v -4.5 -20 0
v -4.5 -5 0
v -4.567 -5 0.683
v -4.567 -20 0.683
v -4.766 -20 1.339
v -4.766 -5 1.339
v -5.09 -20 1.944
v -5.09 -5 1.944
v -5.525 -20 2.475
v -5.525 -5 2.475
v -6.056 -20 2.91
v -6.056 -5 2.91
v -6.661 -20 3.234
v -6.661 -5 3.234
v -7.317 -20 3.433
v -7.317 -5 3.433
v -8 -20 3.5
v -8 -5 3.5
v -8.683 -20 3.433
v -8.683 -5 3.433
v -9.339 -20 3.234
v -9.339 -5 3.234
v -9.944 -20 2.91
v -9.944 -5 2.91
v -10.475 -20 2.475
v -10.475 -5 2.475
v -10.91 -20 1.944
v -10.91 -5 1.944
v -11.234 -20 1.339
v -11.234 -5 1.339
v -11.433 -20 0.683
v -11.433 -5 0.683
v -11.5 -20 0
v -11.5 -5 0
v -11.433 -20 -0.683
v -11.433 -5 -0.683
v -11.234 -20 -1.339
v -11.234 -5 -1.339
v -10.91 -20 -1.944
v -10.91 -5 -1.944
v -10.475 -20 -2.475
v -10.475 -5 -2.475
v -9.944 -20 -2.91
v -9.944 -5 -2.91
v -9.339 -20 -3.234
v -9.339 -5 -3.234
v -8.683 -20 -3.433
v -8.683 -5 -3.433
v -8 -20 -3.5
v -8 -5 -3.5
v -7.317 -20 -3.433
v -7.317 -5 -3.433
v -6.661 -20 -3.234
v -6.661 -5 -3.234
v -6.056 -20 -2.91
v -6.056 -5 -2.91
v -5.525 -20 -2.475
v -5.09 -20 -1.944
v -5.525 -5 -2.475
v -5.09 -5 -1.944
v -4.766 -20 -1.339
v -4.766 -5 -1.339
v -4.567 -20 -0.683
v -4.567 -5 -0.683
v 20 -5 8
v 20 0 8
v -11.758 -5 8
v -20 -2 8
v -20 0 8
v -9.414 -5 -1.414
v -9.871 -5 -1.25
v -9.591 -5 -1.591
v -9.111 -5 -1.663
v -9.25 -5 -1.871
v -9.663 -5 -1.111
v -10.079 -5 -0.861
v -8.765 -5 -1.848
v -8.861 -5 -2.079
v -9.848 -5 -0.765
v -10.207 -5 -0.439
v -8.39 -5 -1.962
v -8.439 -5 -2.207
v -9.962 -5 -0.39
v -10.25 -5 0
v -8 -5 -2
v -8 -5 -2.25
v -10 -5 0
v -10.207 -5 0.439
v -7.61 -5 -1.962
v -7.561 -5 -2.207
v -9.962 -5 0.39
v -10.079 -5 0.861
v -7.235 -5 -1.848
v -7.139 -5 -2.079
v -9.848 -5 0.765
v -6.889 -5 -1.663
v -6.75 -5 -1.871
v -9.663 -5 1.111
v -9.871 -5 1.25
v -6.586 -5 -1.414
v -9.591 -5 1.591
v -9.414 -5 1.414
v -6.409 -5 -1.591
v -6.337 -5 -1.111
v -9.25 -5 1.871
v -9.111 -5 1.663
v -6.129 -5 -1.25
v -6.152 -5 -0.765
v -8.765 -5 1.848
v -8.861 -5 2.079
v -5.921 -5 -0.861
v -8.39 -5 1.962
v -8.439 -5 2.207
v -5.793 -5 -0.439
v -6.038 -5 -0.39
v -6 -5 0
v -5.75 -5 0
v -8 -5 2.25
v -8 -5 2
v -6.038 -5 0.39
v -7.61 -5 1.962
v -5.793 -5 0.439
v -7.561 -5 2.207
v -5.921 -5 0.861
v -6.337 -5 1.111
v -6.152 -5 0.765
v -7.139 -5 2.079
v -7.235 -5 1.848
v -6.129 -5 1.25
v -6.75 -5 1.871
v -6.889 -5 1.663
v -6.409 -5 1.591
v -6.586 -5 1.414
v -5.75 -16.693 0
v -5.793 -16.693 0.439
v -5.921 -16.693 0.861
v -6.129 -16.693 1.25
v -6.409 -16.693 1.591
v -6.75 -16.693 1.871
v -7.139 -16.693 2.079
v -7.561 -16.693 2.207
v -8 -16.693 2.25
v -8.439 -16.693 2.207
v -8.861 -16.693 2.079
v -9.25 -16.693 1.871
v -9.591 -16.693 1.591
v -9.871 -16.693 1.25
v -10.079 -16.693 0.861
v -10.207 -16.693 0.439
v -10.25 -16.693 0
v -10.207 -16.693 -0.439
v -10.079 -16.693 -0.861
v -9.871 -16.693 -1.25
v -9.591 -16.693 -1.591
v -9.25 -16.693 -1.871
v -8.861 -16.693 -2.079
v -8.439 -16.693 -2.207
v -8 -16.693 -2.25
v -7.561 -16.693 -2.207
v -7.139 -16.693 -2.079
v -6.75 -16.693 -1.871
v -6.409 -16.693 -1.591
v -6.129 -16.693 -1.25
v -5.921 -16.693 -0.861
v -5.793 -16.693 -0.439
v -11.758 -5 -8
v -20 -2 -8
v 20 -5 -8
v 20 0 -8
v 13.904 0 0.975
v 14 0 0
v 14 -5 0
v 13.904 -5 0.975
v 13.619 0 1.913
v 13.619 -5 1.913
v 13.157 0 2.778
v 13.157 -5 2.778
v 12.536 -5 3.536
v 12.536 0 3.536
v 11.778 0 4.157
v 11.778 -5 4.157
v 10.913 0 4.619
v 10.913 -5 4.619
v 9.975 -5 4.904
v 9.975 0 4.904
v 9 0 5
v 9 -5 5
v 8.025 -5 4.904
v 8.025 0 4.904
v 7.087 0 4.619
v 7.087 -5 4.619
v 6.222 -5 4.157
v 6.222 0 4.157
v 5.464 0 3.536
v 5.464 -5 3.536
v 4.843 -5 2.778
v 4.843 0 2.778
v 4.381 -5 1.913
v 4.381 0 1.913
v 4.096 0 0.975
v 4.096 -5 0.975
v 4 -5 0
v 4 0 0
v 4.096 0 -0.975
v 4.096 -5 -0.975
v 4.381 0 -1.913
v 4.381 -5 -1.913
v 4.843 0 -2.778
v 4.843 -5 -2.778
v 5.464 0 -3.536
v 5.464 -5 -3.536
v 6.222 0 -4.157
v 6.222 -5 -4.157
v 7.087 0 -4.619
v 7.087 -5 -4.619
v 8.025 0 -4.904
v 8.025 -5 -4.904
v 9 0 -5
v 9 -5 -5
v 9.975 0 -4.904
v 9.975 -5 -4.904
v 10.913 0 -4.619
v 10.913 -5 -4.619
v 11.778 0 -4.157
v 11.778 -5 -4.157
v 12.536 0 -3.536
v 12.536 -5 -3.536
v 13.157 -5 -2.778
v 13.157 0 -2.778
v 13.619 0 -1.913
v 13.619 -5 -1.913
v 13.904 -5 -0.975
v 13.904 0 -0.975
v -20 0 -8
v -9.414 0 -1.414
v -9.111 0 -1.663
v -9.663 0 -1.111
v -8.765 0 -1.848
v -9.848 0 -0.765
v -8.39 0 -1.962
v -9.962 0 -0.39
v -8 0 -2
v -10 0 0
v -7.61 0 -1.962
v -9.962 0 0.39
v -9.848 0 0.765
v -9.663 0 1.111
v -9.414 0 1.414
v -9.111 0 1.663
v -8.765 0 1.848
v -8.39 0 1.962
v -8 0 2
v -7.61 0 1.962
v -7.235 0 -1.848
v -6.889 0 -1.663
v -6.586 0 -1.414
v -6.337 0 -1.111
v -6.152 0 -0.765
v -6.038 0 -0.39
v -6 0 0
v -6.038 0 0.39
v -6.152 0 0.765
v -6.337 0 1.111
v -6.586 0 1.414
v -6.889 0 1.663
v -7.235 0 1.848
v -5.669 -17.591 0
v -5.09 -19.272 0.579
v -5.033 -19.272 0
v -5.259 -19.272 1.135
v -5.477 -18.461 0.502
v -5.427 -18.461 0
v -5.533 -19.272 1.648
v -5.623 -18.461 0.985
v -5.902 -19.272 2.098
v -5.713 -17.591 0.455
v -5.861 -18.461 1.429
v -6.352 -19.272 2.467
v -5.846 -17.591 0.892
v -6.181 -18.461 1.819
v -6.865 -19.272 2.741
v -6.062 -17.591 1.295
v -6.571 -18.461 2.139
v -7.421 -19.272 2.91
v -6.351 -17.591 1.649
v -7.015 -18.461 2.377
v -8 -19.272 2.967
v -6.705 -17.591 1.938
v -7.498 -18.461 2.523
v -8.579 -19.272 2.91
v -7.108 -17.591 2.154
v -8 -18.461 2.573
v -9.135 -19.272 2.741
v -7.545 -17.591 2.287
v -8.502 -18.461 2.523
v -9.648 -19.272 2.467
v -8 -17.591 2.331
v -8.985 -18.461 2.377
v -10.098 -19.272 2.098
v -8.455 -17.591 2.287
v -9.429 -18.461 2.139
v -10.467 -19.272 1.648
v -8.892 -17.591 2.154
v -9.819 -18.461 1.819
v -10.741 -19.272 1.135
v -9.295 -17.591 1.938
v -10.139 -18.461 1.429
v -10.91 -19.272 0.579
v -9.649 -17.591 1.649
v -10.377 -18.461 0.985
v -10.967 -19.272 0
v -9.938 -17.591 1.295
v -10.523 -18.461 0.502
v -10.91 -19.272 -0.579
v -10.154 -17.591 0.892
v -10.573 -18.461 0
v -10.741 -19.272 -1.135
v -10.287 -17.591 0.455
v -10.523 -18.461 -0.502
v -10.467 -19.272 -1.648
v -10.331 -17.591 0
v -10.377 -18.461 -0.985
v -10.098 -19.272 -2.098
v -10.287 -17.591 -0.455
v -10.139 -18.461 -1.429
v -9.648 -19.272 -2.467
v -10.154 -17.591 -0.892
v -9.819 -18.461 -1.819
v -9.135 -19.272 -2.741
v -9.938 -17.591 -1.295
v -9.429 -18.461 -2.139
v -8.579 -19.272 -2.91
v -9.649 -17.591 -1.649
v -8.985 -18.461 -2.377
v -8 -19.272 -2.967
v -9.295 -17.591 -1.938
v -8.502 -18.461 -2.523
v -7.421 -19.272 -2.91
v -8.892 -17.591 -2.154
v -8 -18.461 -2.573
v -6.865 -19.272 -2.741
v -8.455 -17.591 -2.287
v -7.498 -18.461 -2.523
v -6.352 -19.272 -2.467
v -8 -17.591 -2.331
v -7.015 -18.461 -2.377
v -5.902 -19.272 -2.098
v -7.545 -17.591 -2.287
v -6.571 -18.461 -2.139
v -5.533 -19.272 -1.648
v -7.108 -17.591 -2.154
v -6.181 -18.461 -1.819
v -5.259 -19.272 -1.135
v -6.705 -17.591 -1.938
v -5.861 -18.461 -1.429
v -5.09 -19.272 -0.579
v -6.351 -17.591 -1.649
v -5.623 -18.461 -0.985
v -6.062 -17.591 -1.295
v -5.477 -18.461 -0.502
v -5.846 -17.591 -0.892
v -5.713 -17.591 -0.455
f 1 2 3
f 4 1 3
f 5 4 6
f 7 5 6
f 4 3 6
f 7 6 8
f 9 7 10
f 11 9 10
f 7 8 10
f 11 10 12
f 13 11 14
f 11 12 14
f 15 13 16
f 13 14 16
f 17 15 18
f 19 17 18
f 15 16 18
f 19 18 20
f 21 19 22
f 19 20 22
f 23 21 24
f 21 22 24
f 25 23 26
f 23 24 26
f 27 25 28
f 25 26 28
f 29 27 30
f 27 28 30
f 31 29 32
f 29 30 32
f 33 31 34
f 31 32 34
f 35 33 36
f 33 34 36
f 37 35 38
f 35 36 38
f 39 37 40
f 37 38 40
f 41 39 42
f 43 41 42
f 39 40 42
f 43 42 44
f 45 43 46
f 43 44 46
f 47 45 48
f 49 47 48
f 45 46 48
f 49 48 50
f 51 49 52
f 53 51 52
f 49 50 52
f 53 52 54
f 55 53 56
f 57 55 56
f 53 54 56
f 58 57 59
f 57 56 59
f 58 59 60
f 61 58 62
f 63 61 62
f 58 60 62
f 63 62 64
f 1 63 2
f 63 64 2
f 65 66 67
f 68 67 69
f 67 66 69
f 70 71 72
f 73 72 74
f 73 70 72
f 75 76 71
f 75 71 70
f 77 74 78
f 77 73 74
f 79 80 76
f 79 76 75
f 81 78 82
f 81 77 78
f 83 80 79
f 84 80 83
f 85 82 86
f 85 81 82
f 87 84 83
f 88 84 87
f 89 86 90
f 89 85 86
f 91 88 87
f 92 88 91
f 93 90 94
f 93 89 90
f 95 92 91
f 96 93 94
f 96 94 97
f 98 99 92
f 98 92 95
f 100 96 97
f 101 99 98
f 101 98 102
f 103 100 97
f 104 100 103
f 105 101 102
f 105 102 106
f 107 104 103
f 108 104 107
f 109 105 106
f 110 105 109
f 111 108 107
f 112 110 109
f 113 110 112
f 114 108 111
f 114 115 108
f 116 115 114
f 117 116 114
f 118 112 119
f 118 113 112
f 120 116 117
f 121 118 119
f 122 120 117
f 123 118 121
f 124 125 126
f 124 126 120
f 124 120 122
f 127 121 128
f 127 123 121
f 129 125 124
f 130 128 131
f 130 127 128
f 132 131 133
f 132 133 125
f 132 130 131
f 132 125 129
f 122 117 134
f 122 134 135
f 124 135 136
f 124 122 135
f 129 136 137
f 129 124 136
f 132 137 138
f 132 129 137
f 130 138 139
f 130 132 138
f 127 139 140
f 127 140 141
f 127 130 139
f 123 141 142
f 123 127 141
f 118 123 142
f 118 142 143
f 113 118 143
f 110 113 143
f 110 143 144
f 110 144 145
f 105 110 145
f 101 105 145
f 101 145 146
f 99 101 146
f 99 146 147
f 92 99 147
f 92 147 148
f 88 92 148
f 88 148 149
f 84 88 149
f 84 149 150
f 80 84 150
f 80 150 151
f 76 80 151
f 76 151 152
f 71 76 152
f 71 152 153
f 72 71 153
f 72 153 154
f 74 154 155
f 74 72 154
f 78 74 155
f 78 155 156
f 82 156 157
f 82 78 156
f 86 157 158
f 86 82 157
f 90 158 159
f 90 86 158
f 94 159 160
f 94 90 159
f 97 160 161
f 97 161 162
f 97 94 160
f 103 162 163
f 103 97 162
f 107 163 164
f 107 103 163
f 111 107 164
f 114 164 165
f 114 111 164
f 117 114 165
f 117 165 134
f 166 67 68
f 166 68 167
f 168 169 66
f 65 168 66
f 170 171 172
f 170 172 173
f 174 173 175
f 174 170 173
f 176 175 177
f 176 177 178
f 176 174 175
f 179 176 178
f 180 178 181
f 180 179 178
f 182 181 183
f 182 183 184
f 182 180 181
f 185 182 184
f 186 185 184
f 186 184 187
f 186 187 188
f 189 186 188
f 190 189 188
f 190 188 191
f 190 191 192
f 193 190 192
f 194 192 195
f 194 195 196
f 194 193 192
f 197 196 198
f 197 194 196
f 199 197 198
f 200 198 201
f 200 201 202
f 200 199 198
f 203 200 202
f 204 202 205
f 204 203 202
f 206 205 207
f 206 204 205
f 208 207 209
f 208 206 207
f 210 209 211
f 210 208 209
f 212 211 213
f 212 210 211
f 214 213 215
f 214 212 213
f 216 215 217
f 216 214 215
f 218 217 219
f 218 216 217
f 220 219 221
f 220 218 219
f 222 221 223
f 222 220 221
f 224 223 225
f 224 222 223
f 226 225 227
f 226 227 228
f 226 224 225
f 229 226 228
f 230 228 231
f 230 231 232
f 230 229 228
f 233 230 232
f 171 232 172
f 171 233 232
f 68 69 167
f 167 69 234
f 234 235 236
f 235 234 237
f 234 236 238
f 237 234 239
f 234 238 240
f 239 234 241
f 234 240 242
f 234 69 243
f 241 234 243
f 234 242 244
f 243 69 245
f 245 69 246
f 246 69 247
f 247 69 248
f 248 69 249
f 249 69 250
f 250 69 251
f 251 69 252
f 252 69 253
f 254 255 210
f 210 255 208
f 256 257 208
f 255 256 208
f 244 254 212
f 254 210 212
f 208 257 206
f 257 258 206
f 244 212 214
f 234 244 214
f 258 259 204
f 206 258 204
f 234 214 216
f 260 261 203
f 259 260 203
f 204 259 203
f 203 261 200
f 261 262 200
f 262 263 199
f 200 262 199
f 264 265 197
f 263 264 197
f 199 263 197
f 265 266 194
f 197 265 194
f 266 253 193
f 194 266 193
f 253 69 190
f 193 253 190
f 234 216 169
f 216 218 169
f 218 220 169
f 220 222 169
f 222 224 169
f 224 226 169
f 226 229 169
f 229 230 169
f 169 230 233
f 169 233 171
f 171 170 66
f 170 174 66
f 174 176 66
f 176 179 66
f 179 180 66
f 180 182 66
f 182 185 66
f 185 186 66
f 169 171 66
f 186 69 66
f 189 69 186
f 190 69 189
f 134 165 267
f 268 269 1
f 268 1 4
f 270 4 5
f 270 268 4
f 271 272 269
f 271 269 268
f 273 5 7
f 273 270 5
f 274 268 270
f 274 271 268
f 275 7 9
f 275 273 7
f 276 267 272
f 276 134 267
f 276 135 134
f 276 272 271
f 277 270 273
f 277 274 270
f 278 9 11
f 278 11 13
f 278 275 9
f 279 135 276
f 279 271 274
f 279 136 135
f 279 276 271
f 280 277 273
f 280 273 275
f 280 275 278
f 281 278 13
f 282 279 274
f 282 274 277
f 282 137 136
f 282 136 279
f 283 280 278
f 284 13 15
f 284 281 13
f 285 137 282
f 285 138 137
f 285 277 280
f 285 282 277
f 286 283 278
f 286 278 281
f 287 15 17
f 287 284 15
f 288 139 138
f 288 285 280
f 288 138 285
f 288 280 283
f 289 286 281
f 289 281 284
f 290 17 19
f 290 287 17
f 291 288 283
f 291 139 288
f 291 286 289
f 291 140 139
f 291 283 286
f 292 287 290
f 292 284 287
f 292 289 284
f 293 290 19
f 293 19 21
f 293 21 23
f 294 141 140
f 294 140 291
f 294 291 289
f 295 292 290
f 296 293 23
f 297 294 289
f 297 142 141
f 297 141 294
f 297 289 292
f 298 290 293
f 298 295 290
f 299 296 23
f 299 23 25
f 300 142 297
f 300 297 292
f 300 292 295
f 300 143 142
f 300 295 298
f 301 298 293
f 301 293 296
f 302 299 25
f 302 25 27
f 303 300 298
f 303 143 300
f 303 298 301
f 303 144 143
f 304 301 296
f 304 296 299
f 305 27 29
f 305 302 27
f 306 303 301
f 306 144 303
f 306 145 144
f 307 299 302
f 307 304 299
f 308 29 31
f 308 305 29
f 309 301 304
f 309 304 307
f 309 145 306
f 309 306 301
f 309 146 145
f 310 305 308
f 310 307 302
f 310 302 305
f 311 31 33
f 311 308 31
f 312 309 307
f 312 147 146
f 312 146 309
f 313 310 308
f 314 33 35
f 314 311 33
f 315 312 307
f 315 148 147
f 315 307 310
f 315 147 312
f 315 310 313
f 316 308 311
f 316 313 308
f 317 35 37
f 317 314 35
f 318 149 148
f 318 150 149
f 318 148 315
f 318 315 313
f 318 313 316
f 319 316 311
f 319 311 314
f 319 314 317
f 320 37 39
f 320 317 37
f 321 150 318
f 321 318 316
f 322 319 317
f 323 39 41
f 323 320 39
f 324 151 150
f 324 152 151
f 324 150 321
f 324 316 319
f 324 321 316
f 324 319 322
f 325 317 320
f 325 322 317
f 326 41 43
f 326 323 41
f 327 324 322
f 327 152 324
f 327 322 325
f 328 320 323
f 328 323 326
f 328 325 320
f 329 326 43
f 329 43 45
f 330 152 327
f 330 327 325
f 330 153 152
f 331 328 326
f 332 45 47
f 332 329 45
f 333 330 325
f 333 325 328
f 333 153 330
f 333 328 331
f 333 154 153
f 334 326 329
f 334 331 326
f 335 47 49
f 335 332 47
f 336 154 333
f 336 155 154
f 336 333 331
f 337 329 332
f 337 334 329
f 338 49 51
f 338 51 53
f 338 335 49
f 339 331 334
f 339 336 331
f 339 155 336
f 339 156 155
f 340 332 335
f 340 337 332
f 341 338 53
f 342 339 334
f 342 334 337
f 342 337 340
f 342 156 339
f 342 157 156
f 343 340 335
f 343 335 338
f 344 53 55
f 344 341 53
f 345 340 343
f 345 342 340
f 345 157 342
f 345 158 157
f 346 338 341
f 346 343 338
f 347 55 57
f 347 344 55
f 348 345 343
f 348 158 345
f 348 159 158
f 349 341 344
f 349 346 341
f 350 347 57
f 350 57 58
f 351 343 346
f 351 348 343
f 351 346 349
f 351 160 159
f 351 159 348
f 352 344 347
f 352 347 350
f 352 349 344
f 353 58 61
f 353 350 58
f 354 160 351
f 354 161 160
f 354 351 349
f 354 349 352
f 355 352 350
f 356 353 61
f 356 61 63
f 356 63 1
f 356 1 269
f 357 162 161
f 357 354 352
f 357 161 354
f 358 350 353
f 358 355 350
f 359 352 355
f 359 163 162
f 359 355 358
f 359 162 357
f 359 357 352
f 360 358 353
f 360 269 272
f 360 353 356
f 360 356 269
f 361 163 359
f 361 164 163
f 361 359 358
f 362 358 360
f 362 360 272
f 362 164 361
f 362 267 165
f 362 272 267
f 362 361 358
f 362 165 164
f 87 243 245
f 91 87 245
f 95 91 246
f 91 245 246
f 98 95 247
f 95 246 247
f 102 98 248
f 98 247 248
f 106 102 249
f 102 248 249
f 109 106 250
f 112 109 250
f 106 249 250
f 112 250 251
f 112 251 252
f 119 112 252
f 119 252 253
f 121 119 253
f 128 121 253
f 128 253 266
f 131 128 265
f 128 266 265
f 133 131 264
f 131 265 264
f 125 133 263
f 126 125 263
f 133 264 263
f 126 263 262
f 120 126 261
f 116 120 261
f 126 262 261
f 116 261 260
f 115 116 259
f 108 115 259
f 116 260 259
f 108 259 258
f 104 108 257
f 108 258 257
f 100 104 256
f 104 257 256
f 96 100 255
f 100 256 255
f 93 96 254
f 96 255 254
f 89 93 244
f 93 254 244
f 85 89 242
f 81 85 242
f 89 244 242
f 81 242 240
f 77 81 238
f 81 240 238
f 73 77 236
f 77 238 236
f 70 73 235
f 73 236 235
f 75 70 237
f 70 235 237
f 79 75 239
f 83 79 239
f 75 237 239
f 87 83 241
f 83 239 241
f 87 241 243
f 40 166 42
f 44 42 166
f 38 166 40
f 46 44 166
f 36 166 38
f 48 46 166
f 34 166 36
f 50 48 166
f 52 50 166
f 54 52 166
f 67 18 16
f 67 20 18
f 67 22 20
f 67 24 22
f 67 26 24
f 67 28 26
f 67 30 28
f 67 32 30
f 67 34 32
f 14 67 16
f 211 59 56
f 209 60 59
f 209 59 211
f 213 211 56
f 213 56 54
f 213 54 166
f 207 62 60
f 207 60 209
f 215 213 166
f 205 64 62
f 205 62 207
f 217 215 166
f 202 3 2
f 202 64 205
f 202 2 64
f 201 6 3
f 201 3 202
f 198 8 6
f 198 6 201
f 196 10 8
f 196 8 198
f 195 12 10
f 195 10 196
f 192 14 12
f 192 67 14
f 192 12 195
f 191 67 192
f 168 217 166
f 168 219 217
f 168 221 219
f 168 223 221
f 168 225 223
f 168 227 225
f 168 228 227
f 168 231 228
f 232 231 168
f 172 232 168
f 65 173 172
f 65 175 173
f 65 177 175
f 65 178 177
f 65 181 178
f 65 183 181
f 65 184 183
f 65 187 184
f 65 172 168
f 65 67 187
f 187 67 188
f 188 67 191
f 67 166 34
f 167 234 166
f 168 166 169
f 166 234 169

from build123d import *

# Parameters (mm, degrees)
F0_R     = 5
F1_DEPTH = 5
F2_R     = 3.5
F2_R_2   = 2.25
F3_DEPTH = 15
F5_SIZE2 = 8.2424322584
F5_SIZE  = 3


# Not quite as in the source:
# - a fillet or chamfer that OpenCascade refuses, or shapes differently, is made with other operations: its cross-section is extruded or revolved along the edge and cut away or added


with BuildPart() as f1:
    # F0 (on Front) → F1 (new body)
    with BuildSketch(Plane.XZ):
        Polygon((-20, -8), (20, -8), (20, 0), (20, 8), (-20, 8), (-20, 0), align=None)
        with BuildLine():
            ThreePointArc((-6, 0), (-8, -2), (-10, 0))
            ThreePointArc((-10, 0), (-8, 2), (-6, 0))
        make_face(mode=Mode.SUBTRACT)
        with Locations((9, 0)):
            Circle(F0_R, mode=Mode.SUBTRACT)
    extrude(amount=F1_DEPTH)

    # F2 (on face) → F3 (join)
    with BuildSketch(Plane.XZ.offset(5)):
        with Locations((-8, 0)):
            Circle(F2_R)
        with Locations((-8, 0)):
            Circle(F2_R_2, mode=Mode.SUBTRACT)
    extrude(amount=F3_DEPTH)

    # F4: fillet of radius 5 on 1 edges, made by hand

    # F4_s1 → F4_t2 (revolve, cut)
    with BuildSketch(Plane.XY):
        with BuildLine():
            ThreePointArc((-4.5, -20), (-5.4270717335, -18.4605778141), (-5.75, -16.6928108612))
            Line((-5.75, -16.6928108612), (-5.75, -20))
            Line((-5.75, -20), (-4.5, -20))
        make_face()
    revolve(axis=Axis((-8, -20, 0), (0, -1, 0)), mode=Mode.SUBTRACT)

    # F5
    f5_edges = [f1.edges().sort_by_distance(p)[0] for p in [
        (-20, -5, 0),
    ]]
    f5_side = f1.faces().sort_by_distance((-20, -2.5, 0))[0]
    chamfer(f5_edges, length=F5_SIZE, length2=F5_SIZE2, reference=f5_side)


solid = f1.part
